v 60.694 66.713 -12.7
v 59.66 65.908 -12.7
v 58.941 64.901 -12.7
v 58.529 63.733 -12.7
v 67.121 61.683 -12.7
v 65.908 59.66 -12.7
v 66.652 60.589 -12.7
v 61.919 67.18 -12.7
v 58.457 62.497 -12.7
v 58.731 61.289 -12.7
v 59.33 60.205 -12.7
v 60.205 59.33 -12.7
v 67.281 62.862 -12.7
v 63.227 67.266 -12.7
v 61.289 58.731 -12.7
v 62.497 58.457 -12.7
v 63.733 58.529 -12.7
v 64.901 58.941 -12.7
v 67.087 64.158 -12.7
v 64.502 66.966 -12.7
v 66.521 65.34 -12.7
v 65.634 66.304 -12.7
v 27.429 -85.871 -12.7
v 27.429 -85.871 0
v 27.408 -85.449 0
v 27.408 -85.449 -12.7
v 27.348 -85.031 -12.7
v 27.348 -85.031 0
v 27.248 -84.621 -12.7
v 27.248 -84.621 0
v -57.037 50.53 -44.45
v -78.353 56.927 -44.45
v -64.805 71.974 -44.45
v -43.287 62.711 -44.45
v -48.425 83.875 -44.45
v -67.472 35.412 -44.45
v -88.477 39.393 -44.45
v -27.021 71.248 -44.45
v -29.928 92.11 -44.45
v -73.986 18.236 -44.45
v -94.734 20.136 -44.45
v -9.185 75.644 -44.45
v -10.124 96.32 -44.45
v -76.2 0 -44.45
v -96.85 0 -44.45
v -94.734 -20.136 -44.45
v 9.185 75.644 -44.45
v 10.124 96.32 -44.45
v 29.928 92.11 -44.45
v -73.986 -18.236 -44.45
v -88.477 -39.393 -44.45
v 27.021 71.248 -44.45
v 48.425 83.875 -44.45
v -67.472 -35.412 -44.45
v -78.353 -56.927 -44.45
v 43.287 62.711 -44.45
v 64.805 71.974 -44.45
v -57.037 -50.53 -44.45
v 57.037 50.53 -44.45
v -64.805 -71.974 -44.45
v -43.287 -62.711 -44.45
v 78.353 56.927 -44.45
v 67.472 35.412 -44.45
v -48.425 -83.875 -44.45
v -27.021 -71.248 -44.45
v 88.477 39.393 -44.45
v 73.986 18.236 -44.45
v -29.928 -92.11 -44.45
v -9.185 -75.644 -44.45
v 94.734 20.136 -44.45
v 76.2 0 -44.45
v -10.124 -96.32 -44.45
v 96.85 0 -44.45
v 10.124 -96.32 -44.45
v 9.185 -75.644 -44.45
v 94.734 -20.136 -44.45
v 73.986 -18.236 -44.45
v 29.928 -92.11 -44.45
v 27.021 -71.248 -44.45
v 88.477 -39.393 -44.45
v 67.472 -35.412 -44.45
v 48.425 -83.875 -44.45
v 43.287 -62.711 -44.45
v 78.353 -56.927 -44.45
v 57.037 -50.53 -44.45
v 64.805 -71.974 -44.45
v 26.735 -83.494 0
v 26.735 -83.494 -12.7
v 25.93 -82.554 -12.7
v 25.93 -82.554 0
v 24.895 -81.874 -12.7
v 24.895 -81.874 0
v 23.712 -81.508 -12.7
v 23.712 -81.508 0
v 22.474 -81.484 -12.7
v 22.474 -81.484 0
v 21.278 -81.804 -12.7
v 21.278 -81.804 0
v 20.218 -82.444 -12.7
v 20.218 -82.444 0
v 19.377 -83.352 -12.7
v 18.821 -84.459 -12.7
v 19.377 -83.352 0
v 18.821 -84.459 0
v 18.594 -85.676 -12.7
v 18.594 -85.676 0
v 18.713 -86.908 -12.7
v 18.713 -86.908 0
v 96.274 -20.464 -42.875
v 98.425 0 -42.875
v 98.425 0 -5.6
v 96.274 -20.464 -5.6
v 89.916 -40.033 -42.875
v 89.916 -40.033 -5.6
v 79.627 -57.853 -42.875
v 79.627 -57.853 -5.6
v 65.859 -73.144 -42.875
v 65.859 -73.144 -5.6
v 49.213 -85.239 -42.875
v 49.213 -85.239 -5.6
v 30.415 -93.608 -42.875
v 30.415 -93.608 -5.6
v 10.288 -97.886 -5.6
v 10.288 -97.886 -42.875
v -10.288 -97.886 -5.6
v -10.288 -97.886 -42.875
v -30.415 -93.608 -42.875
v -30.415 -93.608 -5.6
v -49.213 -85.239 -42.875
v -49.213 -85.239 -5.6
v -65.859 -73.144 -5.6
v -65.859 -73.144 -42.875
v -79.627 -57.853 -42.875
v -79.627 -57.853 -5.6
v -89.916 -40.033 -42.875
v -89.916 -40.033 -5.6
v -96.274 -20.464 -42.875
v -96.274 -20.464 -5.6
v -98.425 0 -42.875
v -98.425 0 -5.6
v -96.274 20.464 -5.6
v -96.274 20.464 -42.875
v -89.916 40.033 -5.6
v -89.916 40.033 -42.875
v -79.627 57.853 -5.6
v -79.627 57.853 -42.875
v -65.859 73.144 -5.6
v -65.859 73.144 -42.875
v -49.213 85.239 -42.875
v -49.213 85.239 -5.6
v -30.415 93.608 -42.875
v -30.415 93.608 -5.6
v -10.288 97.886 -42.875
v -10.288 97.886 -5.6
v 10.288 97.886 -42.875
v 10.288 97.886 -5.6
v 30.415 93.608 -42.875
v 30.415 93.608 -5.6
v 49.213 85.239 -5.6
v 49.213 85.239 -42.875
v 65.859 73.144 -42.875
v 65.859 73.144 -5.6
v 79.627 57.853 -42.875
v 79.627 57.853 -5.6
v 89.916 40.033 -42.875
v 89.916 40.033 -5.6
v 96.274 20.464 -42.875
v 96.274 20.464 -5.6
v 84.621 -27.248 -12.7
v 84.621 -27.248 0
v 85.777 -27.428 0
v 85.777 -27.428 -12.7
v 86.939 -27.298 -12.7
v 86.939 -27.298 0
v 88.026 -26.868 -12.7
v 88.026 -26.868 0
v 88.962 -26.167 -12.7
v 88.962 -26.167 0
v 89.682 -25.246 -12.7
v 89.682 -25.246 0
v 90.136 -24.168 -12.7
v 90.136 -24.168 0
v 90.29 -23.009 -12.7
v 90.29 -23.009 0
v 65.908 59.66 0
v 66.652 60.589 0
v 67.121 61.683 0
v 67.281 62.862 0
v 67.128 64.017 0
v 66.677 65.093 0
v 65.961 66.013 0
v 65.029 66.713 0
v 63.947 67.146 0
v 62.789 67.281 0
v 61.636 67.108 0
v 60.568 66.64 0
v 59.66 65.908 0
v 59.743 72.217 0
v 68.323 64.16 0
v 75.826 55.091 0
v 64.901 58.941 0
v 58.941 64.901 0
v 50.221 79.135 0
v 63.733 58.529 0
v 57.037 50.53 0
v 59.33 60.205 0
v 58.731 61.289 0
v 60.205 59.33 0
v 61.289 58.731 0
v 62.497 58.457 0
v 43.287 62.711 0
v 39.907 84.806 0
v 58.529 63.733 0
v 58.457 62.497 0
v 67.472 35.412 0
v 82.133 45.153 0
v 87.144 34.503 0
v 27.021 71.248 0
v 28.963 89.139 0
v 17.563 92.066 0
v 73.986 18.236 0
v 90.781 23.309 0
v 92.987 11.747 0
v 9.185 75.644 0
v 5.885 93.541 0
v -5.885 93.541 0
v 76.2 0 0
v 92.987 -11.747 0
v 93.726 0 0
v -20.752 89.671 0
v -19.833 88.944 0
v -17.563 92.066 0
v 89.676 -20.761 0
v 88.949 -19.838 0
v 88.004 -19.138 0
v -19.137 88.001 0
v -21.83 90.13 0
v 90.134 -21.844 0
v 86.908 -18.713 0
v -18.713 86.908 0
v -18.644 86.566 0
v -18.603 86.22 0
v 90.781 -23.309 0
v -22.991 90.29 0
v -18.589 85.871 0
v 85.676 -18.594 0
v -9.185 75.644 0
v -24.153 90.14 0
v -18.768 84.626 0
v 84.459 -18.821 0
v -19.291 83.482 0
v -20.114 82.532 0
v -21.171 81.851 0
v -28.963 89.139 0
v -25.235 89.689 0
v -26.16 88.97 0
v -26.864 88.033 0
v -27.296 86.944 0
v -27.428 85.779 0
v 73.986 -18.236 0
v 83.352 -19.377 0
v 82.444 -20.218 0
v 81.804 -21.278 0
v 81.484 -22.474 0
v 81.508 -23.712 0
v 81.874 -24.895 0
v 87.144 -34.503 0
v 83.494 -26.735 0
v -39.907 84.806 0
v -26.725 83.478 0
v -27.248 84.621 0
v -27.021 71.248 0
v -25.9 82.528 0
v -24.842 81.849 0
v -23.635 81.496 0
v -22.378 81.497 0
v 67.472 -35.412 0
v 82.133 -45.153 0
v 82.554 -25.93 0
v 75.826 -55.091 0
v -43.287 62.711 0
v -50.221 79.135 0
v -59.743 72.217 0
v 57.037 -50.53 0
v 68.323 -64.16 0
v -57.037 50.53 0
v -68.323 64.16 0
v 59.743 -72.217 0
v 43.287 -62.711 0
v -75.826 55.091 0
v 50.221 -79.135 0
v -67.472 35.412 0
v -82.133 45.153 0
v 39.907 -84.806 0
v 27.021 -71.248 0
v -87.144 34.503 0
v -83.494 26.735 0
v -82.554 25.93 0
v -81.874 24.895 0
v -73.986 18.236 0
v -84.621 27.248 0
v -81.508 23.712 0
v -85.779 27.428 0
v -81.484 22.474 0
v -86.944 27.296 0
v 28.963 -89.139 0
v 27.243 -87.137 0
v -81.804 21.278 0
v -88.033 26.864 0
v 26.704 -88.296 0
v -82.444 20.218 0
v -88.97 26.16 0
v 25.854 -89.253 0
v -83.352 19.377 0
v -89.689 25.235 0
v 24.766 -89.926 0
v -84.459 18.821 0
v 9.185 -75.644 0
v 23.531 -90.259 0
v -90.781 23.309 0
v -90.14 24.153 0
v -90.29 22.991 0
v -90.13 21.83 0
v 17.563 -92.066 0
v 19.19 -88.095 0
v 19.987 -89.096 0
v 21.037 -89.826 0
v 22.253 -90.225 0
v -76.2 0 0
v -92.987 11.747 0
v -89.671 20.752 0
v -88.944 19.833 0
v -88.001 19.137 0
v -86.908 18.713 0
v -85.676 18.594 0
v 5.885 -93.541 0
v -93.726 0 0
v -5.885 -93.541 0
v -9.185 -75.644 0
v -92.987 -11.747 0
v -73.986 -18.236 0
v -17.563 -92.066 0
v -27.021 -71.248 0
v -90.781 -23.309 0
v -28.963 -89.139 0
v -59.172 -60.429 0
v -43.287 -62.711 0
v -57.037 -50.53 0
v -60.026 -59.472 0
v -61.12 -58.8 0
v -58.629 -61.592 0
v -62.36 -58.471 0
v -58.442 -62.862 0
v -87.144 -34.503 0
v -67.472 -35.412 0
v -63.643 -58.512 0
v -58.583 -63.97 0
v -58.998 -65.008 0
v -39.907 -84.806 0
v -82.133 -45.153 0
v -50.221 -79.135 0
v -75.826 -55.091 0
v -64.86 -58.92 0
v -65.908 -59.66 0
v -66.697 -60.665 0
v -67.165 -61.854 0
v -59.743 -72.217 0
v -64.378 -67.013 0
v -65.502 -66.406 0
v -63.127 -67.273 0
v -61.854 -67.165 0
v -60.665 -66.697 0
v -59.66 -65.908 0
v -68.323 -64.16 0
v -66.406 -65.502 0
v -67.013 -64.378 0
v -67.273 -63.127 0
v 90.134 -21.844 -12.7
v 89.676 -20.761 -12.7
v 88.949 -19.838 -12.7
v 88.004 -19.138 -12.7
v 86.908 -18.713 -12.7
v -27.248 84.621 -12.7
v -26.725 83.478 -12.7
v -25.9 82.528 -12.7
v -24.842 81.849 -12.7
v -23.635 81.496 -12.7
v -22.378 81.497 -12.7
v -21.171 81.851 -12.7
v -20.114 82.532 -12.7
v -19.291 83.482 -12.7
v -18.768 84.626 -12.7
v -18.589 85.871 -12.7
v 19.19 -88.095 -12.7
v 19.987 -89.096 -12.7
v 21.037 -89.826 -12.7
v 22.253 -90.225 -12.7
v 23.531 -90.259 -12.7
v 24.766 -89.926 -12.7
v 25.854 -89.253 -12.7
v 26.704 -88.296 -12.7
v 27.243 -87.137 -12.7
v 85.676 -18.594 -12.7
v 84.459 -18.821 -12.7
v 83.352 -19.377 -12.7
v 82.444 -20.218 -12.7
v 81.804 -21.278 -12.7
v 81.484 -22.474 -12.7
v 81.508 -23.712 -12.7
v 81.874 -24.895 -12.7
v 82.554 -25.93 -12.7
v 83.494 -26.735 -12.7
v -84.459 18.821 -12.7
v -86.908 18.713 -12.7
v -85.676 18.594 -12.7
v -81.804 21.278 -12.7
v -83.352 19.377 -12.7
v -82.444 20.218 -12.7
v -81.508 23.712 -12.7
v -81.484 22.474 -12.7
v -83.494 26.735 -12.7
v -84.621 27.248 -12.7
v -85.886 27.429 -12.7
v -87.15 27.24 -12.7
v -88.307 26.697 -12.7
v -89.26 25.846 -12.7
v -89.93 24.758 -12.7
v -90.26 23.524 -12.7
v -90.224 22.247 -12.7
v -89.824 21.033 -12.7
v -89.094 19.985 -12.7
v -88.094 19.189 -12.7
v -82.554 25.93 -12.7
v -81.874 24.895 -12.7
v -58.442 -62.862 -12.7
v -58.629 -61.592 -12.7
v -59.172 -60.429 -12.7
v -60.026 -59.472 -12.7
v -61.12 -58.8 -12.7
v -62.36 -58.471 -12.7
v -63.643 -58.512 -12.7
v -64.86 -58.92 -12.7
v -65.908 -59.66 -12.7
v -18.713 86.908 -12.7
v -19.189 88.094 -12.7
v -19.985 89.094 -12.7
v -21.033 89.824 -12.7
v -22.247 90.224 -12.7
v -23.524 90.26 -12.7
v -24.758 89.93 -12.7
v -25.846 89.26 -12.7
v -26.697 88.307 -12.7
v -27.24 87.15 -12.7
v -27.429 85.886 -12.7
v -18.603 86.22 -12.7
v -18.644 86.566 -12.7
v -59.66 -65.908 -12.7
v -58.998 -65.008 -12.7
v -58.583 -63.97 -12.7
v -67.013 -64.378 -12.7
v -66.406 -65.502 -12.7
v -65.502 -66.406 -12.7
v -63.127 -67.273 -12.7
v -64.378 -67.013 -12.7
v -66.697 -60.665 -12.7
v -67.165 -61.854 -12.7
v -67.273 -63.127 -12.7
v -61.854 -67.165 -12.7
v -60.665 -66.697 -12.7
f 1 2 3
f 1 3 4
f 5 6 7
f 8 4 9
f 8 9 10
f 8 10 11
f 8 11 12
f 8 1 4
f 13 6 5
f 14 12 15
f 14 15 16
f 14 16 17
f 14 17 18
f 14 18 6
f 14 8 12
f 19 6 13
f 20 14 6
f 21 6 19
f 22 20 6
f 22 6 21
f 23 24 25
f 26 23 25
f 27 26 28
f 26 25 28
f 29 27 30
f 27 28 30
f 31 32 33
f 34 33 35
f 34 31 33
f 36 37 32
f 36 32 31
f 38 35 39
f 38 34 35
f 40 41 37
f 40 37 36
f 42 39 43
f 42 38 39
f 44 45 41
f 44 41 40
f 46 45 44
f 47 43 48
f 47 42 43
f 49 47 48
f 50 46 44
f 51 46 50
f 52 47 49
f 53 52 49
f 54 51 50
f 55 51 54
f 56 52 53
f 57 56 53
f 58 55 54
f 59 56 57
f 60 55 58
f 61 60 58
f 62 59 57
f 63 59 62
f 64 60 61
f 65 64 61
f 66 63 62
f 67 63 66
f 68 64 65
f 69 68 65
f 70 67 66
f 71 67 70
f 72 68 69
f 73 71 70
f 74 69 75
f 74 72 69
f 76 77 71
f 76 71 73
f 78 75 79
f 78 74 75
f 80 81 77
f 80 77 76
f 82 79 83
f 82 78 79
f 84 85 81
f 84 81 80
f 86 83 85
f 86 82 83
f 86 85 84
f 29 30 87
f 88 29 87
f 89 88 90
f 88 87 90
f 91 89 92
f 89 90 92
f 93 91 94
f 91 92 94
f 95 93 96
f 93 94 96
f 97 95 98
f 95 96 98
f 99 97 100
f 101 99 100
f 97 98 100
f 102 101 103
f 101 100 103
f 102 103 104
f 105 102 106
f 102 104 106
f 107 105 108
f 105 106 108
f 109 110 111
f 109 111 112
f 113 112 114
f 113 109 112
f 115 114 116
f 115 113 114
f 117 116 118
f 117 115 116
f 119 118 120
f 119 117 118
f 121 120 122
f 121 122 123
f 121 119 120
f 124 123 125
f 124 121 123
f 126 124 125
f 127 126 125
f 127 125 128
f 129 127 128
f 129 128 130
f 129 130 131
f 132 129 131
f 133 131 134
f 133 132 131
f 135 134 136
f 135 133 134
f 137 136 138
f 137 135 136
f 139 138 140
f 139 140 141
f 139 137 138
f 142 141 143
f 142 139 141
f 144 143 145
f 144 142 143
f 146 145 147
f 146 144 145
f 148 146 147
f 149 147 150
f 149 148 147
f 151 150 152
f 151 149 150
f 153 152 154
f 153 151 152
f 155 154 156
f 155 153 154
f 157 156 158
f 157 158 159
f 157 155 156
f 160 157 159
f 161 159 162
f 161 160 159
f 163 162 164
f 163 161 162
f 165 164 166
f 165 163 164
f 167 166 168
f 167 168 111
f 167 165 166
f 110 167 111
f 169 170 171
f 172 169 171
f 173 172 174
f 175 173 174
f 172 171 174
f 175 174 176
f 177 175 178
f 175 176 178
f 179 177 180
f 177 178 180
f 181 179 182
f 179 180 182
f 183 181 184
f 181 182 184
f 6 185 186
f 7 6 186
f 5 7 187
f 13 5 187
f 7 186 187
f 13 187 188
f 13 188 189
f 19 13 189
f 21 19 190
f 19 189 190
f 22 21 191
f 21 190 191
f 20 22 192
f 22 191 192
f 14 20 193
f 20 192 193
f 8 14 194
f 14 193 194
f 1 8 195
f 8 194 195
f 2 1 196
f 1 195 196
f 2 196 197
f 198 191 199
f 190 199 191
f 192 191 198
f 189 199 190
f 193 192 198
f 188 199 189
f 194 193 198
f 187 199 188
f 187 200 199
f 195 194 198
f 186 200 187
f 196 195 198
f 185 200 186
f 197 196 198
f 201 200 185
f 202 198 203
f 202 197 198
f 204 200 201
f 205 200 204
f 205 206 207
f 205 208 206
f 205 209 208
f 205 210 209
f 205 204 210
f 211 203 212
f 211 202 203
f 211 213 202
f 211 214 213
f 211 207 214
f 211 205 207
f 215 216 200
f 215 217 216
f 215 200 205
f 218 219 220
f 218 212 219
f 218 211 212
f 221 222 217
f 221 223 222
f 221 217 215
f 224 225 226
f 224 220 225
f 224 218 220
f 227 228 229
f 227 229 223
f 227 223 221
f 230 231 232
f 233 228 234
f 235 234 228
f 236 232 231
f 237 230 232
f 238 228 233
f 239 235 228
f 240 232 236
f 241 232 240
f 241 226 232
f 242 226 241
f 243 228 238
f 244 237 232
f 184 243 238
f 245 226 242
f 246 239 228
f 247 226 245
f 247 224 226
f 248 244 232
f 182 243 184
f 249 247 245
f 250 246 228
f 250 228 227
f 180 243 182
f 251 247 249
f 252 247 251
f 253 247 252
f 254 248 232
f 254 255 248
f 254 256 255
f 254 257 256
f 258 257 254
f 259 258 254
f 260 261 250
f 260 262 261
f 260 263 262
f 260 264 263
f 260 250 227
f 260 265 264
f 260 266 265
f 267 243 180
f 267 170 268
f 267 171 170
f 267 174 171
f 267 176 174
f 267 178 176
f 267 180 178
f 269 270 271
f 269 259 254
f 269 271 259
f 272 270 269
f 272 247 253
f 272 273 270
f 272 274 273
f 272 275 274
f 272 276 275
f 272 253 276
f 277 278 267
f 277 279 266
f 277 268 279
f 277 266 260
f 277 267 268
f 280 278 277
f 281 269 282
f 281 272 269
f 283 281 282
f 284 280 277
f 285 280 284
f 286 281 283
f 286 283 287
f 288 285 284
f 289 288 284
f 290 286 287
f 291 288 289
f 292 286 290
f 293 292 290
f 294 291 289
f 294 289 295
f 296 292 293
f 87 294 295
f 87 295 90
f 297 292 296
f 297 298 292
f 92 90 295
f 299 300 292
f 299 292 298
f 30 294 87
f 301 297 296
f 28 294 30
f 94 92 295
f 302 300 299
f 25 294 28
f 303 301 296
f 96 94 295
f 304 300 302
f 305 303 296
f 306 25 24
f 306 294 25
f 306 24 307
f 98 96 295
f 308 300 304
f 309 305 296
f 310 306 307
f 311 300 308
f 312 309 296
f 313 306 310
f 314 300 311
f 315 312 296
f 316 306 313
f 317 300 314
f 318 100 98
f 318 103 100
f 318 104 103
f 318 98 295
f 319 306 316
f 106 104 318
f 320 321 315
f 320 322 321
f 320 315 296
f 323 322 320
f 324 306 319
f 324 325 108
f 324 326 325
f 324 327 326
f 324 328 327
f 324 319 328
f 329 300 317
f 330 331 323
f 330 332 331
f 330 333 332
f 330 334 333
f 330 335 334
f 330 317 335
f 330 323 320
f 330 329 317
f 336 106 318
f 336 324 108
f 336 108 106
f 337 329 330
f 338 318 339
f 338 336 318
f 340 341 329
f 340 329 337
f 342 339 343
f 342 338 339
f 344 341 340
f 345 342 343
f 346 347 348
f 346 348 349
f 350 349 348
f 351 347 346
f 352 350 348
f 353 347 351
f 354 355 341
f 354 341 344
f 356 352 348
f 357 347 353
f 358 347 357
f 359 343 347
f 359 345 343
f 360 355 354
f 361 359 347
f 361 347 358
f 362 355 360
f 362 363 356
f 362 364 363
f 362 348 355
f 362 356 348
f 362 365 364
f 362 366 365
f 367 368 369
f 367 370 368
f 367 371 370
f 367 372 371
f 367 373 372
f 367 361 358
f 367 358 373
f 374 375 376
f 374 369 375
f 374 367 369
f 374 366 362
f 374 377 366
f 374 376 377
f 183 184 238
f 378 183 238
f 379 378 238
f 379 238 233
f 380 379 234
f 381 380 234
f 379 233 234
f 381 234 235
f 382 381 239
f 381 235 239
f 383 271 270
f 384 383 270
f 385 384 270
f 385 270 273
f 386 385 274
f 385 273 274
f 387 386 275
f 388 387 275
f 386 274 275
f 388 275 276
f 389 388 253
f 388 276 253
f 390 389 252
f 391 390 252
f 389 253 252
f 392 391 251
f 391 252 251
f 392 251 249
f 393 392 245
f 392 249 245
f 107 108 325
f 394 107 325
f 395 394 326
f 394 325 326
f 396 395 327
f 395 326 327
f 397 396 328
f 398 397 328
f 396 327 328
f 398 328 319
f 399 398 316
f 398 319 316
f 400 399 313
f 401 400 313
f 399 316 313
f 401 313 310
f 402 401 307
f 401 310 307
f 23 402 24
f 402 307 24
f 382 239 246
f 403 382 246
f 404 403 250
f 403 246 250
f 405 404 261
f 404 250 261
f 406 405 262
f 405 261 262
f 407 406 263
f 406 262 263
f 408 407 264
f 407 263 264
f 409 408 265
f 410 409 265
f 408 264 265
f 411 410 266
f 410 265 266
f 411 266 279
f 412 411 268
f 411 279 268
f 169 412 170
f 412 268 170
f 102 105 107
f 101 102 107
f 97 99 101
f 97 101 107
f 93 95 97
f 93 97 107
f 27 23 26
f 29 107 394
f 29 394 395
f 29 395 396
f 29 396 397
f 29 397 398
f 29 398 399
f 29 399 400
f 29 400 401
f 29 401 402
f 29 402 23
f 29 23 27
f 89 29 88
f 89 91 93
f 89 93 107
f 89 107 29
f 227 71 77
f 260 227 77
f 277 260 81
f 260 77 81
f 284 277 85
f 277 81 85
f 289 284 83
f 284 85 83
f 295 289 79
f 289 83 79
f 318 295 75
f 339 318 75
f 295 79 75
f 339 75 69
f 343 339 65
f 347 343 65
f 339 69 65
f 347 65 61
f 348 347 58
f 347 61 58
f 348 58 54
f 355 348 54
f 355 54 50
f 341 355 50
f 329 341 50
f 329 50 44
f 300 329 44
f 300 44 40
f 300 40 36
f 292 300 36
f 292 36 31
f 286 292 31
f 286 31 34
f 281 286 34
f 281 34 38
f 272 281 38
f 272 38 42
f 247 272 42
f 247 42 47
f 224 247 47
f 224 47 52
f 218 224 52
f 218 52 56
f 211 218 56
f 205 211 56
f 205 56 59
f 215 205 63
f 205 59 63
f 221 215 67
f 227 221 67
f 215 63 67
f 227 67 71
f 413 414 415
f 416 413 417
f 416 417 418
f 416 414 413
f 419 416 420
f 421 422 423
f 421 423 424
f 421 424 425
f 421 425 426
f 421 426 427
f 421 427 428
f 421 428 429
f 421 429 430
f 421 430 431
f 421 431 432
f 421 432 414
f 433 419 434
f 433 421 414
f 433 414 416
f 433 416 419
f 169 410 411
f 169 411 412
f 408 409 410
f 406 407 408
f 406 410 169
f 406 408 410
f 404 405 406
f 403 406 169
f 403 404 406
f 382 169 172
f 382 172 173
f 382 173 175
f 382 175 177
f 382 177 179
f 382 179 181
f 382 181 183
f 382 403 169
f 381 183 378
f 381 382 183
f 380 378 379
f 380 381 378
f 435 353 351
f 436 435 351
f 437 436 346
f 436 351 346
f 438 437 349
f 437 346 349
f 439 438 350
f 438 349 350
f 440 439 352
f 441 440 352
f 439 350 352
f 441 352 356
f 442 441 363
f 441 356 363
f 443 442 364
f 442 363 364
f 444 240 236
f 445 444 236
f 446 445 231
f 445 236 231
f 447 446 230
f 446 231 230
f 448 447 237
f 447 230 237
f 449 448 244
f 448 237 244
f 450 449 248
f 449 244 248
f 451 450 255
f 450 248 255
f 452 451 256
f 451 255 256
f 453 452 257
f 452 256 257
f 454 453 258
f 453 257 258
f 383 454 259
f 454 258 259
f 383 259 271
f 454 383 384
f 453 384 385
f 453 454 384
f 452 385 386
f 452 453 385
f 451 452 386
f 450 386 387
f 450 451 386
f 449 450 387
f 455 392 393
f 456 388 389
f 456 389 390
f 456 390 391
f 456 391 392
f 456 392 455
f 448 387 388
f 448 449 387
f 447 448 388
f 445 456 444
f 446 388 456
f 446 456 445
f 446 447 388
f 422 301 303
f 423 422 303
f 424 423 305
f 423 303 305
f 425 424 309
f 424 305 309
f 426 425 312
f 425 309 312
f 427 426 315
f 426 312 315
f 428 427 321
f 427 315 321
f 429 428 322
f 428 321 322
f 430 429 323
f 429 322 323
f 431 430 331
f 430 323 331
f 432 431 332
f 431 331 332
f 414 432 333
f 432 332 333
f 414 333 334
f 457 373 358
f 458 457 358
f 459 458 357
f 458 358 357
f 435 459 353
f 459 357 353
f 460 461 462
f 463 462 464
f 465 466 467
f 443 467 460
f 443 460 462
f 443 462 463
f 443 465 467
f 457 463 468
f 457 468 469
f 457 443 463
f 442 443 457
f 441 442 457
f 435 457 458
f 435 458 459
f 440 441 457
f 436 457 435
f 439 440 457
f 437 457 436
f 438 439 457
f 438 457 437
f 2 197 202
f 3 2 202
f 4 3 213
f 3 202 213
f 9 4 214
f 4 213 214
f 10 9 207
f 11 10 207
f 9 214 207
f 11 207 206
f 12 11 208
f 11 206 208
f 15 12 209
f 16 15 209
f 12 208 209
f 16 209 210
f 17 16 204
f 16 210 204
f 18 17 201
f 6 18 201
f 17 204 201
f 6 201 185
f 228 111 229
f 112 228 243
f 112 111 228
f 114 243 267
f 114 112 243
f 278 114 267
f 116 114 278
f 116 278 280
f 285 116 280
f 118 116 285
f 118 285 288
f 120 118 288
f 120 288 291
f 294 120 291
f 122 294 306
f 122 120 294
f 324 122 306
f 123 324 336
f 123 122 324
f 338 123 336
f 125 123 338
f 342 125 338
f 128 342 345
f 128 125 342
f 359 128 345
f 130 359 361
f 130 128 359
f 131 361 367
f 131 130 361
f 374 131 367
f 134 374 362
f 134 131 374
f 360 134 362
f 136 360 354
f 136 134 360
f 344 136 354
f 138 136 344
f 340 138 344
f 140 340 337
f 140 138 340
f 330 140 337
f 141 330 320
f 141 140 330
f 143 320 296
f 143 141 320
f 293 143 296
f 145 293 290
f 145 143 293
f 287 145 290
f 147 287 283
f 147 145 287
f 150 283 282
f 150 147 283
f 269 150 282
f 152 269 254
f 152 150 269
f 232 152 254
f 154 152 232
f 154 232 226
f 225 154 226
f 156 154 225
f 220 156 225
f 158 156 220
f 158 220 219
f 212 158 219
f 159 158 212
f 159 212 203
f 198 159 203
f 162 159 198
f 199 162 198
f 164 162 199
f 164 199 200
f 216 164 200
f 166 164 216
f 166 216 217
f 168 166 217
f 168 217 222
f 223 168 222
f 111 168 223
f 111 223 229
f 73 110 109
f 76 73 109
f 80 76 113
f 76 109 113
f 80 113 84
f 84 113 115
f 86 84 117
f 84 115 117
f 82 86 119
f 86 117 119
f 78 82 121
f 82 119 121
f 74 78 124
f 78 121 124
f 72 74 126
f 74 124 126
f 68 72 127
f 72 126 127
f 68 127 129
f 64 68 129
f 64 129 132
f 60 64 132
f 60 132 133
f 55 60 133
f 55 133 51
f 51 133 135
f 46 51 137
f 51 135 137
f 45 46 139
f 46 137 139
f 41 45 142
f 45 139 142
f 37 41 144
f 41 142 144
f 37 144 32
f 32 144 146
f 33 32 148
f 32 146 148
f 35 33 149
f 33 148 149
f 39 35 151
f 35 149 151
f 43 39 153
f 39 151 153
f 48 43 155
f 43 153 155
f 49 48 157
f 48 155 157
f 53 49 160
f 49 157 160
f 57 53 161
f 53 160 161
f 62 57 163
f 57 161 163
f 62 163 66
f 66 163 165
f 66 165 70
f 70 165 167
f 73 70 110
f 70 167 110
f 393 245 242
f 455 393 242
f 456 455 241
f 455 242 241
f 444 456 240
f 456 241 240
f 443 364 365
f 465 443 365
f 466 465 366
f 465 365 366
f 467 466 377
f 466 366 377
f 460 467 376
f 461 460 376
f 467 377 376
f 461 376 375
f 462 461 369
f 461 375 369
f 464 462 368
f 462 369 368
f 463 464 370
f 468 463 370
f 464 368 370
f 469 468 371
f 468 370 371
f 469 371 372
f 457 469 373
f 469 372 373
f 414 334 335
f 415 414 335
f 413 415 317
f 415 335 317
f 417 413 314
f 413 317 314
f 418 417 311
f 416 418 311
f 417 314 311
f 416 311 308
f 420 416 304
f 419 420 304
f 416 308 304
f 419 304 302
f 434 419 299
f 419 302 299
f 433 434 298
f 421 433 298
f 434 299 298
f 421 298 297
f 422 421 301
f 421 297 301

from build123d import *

# Parameters (mm, degrees)
F2_SIZE2 = 1.5748
F2_SIZE  = 1.5748
F4_DEPTH = 12.7
F5_R     = 76.2
F6_DEPTH = 44.451
F8_ANGLE = 180


with BuildPart() as f1:
    # F0 (on Front) → F1 (revolve)
    with BuildSketch(Plane.XZ):
        Polygon((98.425, 0), (0, 0), (0, -44.45), (93.726, -44.45), (98.425, -38.8499498684), align=None)
    revolve(axis=Axis((0, 0, -22.225), (0, 0, 1)))

    # F2
    f2_edges = [f1.edges().sort_by_distance(p)[0] for p in [
        (-98.425, 0, 0),
    ]]
    chamfer(f2_edges, length=F2_SIZE, length2=F2_SIZE2)

    # F3 (on face) → F4 (cut)
    with BuildSketch(Plane(origin=(0, 0, -44.45), x_dir=(1, 0, 0), z_dir=(0, 0, -1))):
        with BuildLine():
            ThreePointArc((-18.5894131096, 85.8708059571), (-18.6203916237, 86.3931713593), (-18.7128928876, 86.9082138798))
            ThreePointArc((-18.7128928876, 86.9082138798), (-23.0090131096, 85.8708059571), (-27.2482663209, 84.6211674612))
            ThreePointArc((-27.2482663209, 84.6211674612), (-22.3777205201, 81.4965250075), (-18.5894131096, 85.8708059571))
        make_face()
        with BuildLine():
            ThreePointArc((-27.2482663209, 84.6211674612), (-23.0090131096, 85.8708059571), (-18.7128928876, 86.9082138798))
            ThreePointArc((-18.7128928876, 86.9082138798), (-24.1528897613, 90.139811739), (-27.2482663209, 84.6211674612))
        make_face()
        with BuildLine():
            ThreePointArc((59.6599475589, 65.9082745736), (62.8617928475, 62.8617928475), (65.9082745736, 59.6599475589))
            ThreePointArc((65.9082745736, 59.6599475589), (66.923633243, 61.1198638129), (67.2813928475, 62.8617928475))
            ThreePointArc((67.2813928475, 62.8617928475), (64.5022179025, 66.9656775679), (59.6599475589, 65.9082745736))
        make_face()
        with BuildLine():
            ThreePointArc((59.6599475589, 65.9082745736), (59.7366637174, 59.7366637174), (65.9082745736, 59.6599475589))
            ThreePointArc((65.9082745736, 59.6599475589), (62.8617928475, 62.8617928475), (59.6599475589, 65.9082745736))
        make_face()
        with BuildLine():
            ThreePointArc((-86.9082138798, 18.7128928876), (-85.8708059571, 23.0090131096), (-84.6211674612, 27.2482663209))
            ThreePointArc((-84.6211674612, 27.2482663209), (-90.139811739, 24.1528897613), (-86.9082138798, 18.7128928876))
        make_face()
        with BuildLine():
            ThreePointArc((-81.4512059571, 23.0090131096), (-82.3313309638, 25.6557055609), (-84.6211674612, 27.2482663209))
            ThreePointArc((-84.6211674612, 27.2482663209), (-85.8708059571, 23.0090131096), (-86.9082138798, 18.7128928876))
            ThreePointArc((-86.9082138798, 18.7128928876), (-83.1369500625, 19.5364209787), (-81.4512059571, 23.0090131096))
        make_face()
        with BuildLine():
            ThreePointArc((-65.9082745736, -59.6599475589), (-62.8617928475, -62.8617928475), (-59.6599475589, -65.9082745736))
            ThreePointArc((-59.6599475589, -65.9082745736), (-58.757908127, -64.5022179025), (-58.4421928475, -62.8617928475))
            ThreePointArc((-58.4421928475, -62.8617928475), (-61.1198638129, -58.799952452), (-65.9082745736, -59.6599475589))
        make_face()
        with BuildLine():
            ThreePointArc((-65.9082745736, -59.6599475589), (-65.9869219776, -65.9869219776), (-59.6599475589, -65.9082745736))
            ThreePointArc((-59.6599475589, -65.9082745736), (-62.8617928475, -62.8617928475), (-65.9082745736, -59.6599475589))
        make_face()
        with BuildLine():
            ThreePointArc((18.7128928876, -86.9082138798), (23.0090131096, -85.8708059571), (27.2482663209, -84.6211674612))
            ThreePointArc((27.2482663209, -84.6211674612), (21.8651364579, -81.6018001752), (18.7128928876, -86.9082138798))
        make_face()
        with BuildLine():
            ThreePointArc((27.4286131096, -85.8708059571), (27.3832940593, -85.2395133675), (27.2482663209, -84.6211674612))
            ThreePointArc((27.2482663209, -84.6211674612), (23.0090131096, -85.8708059571), (18.7128928876, -86.9082138798))
            ThreePointArc((18.7128928876, -86.9082138798), (23.5313785118, -90.259427443), (27.4286131096, -85.8708059571))
        make_face()
        with BuildLine():
            ThreePointArc((84.6211674612, -27.2482663209), (85.8708059571, -23.0090131096), (86.9082138798, -18.7128928876))
            ThreePointArc((86.9082138798, -18.7128928876), (81.6018001752, -21.8651364579), (84.6211674612, -27.2482663209))
        make_face()
        with BuildLine():
            ThreePointArc((90.2904059571, -23.0090131096), (89.343398088, -20.275157215), (86.9082138798, -18.7128928876))
            ThreePointArc((86.9082138798, -18.7128928876), (85.8708059571, -23.0090131096), (84.6211674612, -27.2482663209))
            ThreePointArc((84.6211674612, -27.2482663209), (88.5174984084, -26.5484881029), (90.2904059571, -23.0090131096))
        make_face()
    extrude(amount=-F4_DEPTH, mode=Mode.SUBTRACT)

    # F5 (on face) → F6 (cut, through all)
    with BuildSketch(Plane.XY):
        Circle(F5_R)
    extrude(amount=-F6_DEPTH, mode=Mode.SUBTRACT)


with BuildPart() as f1_1:
    # F8: moved
    add(f1.part.rotate(Axis((4.3097957969, 0, 0), (-1, 0, 0)), F8_ANGLE))


with BuildPart() as f1_2:
    # F9: moved
    add(f1_1.part.moved(Location((0, 0, -44.45))))


solid = f1_2.part
